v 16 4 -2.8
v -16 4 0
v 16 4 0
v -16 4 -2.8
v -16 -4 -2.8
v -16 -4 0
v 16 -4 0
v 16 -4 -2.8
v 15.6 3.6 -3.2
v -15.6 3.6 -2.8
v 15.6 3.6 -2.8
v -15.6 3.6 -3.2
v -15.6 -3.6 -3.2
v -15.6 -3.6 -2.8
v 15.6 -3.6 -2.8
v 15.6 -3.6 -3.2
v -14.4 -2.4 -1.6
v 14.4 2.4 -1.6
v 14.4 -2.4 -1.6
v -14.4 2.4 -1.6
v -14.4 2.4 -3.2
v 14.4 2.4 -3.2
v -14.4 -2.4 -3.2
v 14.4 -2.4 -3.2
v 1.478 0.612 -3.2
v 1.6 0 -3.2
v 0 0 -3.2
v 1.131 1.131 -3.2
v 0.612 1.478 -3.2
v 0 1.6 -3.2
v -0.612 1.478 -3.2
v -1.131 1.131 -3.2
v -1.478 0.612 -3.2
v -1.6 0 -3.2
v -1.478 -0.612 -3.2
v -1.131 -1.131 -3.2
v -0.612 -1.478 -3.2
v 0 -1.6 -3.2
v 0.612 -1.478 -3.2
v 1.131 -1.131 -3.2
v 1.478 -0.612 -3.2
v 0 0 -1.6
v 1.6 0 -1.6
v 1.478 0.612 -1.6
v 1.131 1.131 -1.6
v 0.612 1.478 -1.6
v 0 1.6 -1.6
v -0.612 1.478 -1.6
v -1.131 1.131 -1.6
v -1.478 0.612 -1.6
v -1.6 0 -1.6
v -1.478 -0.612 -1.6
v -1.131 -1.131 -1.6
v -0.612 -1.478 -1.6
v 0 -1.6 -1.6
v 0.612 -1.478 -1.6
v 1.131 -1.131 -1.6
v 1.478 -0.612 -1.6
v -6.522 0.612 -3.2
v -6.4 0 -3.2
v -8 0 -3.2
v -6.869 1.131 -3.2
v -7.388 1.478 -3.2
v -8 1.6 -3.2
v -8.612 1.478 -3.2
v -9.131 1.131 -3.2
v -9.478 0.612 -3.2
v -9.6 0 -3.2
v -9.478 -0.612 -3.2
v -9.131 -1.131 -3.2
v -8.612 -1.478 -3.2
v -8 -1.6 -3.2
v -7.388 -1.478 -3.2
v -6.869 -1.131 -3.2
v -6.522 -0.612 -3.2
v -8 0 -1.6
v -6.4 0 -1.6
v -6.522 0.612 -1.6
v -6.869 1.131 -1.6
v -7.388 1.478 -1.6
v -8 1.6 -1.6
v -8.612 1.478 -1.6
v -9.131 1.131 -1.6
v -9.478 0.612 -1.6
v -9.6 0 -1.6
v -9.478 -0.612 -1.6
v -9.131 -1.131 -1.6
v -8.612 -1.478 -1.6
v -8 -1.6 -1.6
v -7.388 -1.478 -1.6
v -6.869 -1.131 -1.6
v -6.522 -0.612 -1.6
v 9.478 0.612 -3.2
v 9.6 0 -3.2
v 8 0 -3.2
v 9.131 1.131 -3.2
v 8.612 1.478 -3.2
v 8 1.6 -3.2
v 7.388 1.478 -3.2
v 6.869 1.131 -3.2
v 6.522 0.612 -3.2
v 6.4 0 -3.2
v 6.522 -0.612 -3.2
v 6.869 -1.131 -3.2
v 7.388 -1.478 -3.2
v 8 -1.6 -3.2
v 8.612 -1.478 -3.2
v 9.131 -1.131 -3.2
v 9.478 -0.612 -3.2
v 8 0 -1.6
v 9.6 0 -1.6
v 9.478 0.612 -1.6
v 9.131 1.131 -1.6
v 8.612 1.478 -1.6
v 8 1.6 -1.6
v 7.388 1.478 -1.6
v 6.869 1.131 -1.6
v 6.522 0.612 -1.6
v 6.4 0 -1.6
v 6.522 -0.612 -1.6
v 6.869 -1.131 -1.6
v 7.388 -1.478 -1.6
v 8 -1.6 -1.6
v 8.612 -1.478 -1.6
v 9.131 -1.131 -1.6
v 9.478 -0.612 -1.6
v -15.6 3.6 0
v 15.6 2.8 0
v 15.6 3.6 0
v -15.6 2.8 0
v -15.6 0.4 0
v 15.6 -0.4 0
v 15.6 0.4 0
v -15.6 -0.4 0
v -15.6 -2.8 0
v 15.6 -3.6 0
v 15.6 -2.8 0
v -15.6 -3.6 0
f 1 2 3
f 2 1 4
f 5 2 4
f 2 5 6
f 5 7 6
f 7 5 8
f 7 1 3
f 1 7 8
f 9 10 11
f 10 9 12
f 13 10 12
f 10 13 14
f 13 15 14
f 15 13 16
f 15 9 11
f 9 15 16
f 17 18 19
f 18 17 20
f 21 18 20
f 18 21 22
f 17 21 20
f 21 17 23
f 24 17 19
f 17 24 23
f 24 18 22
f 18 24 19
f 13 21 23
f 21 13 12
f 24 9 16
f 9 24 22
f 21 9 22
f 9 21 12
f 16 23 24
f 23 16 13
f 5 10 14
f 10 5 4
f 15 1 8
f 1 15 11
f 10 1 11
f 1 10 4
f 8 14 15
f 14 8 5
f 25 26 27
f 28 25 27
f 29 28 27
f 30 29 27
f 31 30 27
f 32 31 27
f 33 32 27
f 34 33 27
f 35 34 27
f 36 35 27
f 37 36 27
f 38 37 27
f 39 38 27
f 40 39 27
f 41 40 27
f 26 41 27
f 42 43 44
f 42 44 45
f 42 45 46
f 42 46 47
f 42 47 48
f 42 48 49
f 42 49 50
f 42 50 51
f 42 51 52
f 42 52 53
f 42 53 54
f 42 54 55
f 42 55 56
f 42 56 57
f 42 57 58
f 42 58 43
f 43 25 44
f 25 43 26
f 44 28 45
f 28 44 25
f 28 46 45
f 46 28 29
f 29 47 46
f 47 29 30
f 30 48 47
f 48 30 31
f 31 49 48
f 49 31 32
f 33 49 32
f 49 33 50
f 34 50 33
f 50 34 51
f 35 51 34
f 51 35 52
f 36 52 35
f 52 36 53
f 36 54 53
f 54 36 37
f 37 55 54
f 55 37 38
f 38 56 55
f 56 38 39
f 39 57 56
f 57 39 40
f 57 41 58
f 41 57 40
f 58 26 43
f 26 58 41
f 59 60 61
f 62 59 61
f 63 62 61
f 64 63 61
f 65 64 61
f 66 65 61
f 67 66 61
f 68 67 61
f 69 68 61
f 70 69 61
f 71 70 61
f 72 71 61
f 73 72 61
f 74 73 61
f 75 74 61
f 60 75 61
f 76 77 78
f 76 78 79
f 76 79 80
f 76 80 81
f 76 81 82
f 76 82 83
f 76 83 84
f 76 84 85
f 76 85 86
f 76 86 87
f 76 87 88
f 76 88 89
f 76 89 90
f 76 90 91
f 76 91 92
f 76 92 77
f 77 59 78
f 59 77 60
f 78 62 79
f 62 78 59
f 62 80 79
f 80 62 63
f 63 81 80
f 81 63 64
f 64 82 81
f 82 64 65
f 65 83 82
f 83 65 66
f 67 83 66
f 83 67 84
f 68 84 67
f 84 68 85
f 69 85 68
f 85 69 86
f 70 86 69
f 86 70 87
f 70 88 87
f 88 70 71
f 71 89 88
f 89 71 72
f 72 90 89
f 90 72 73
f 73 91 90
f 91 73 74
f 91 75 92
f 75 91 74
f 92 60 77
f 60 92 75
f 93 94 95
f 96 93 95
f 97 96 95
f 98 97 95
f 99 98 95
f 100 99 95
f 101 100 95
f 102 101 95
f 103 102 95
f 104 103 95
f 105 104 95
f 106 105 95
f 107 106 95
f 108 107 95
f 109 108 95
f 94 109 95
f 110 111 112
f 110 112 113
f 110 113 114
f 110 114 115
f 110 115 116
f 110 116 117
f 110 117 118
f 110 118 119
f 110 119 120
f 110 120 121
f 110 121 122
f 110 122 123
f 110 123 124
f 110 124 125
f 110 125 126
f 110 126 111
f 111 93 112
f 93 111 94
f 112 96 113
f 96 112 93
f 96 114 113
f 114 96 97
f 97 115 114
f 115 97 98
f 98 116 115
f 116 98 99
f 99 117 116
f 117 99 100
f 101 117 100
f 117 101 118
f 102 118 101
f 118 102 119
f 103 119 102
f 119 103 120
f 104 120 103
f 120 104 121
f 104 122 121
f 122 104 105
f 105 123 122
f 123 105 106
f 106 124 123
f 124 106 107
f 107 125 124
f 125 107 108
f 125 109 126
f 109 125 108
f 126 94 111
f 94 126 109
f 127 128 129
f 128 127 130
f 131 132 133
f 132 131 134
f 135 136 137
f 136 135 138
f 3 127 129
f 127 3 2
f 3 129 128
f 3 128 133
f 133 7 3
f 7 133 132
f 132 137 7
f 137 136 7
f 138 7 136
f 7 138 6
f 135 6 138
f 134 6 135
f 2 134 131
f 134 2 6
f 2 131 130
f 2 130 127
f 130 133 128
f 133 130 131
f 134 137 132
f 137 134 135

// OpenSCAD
// file: ../p/4-4edge.scad
use <../lib.scad>
function ldraw_lib__4_4edge() = [
// 0 Circle 1.0
// 0 Name: 4-4edge.dat
// 0 Author: James Jessiman
// 0 !LDRAW_ORG Primitive UPDATE 2017-01
// 0 !LICENSE Licensed under CC BY 2.0 and CC BY 4.0 : see CAreadme.txt
// 
// 0 BFC CERTIFY CCW
  [0,"BFC","CERTIFY"],
  [0,"BFC","CCW"],
// 
// 0 !HISTORY 1998-12-15 [PTadmin] Official Update 1998-10
// 0 !HISTORY 2005-12-28 [PTadmin] Official Update 2005-01
// 0 !HISTORY 2007-06-24 [PTadmin] Header formatted for Contributor Agreement
// 0 !HISTORY 2008-07-01 [PTadmin] Official Update 2008-01
// 0 !HISTORY 2017-01-15 [Steffen] BFCed
// 0 !HISTORY 2017-12-30 [PTadmin] Official Update 2017-01
// 
// 
// 2 24 1 0 0 0.9239 0 0.3827
  [2,24,1,0,0,0.9239,0,0.3827],
// 2 24 0.9239 0 0.3827 0.7071 0 0.7071
  [2,24,0.9239,0,0.3827,0.7071,0,0.7071],
// 2 24 0.7071 0 0.7071 0.3827 0 0.9239
  [2,24,0.7071,0,0.7071,0.3827,0,0.9239],
// 2 24 0.3827 0 0.9239 0 0 1
  [2,24,0.3827,0,0.9239,0,0,1],
// 2 24 0 0 1 -0.3827 0 0.9239
  [2,24,0,0,1,-0.3827,0,0.9239],
// 2 24 -0.3827 0 0.9239 -0.7071 0 0.7071
  [2,24,-0.3827,0,0.9239,-0.7071,0,0.7071],
// 2 24 -0.7071 0 0.7071 -0.9239 0 0.3827
  [2,24,-0.7071,0,0.7071,-0.9239,0,0.3827],
// 2 24 -0.9239 0 0.3827 -1 0 -0
  [2,24,-0.9239,0,0.3827,-1,0,-0],
// 2 24 -1 0 -0 -0.9239 0 -0.3827
  [2,24,-1,0,-0,-0.9239,0,-0.3827],
// 2 24 -0.9239 0 -0.3827 -0.7071 0 -0.7071
  [2,24,-0.9239,0,-0.3827,-0.7071,0,-0.7071],
// 2 24 -0.7071 0 -0.7071 -0.3827 0 -0.9239
  [2,24,-0.7071,0,-0.7071,-0.3827,0,-0.9239],
// 2 24 -0.3827 0 -0.9239 0 0 -1
  [2,24,-0.3827,0,-0.9239,0,0,-1],
// 2 24 0 0 -1 0.3827 0 -0.9239
  [2,24,0,0,-1,0.3827,0,-0.9239],
// 2 24 0.3827 0 -0.9239 0.7071 0 -0.7071
  [2,24,0.3827,0,-0.9239,0.7071,0,-0.7071],
// 2 24 0.7071 0 -0.7071 0.9239 0 -0.3827
  [2,24,0.7071,0,-0.7071,0.9239,0,-0.3827],
// 2 24 0.9239 0 -0.3827 1 0 0
  [2,24,0.9239,0,-0.3827,1,0,0],
];
module ldraw_lib__4_4edge(step=0, col=false, unit=2/5, alt=false, line=0.2, solid=!$preview)
    makepoly(ldraw_lib__4_4edge(), step=step, col=col, unit=unit, alt=alt, line=line, solid=solid);
ldraw_lib__4_4edge(line=0.2);
// file: ../p/4-4disc.scad
use <../lib.scad>
function ldraw_lib__4_4disc() = [
// 0 Disc 1.0
// 0 Name: 4-4disc.dat
// 0 Author: James Jessiman
// 0 !LDRAW_ORG Primitive UPDATE 2002-02
// 0 !LICENSE Licensed under CC BY 2.0 and CC BY 4.0 : see CAreadme.txt
// 
// 0 BFC CERTIFY CCW
  [0,"BFC","CERTIFY"],
  [0,"BFC","CCW"],
// 
// 0 !HISTORY 1998-12-15 [PTadmin] Official Update 1998-10
// 0 !HISTORY 2002-03-23 [sbliss] Added BFC statement
// 0 !HISTORY 2002-04-25 [PTadmin] Official Update 2002-02
// 0 !HISTORY 2007-06-24 [PTadmin] Header formatted for Contributor Agreement
// 0 !HISTORY 2008-07-01 [PTadmin] Official Update 2008-01
// 
// 
// 3 16 0 0 0 1 0 0 0.9239 0 0.3827
  [3,16,0,0,0,1,0,0,0.9239,0,0.3827],
// 3 16 0 0 0 0.9239 0 0.3827 0.7071 0 0.7071
  [3,16,0,0,0,0.9239,0,0.3827,0.7071,0,0.7071],
// 3 16 0 0 0 0.7071 0 0.7071 0.3827 0 0.9239
  [3,16,0,0,0,0.7071,0,0.7071,0.3827,0,0.9239],
// 3 16 0 0 0 0.3827 0 0.9239 0 0 1
  [3,16,0,0,0,0.3827,0,0.9239,0,0,1],
// 3 16 0 0 0 0 0 1 -0.3827 0 0.9239
  [3,16,0,0,0,0,0,1,-0.3827,0,0.9239],
// 3 16 0 0 0 -0.3827 0 0.9239 -0.7071 0 0.7071
  [3,16,0,0,0,-0.3827,0,0.9239,-0.7071,0,0.7071],
// 3 16 0 0 0 -0.7071 0 0.7071 -0.9239 0 0.3827
  [3,16,0,0,0,-0.7071,0,0.7071,-0.9239,0,0.3827],
// 3 16 0 0 0 -0.9239 0 0.3827 -1 0 -0
  [3,16,0,0,0,-0.9239,0,0.3827,-1,0,-0],
// 3 16 0 0 0 -1 0 -0 -0.9239 0 -0.3827
  [3,16,0,0,0,-1,0,-0,-0.9239,0,-0.3827],
// 3 16 0 0 0 -0.9239 0 -0.3827 -0.7071 0 -0.7071
  [3,16,0,0,0,-0.9239,0,-0.3827,-0.7071,0,-0.7071],
// 3 16 0 0 0 -0.7071 0 -0.7071 -0.3827 0 -0.9239
  [3,16,0,0,0,-0.7071,0,-0.7071,-0.3827,0,-0.9239],
// 3 16 0 0 0 -0.3827 0 -0.9239 0 0 -1
  [3,16,0,0,0,-0.3827,0,-0.9239,0,0,-1],
// 3 16 0 0 0 0 0 -1 0.3827 0 -0.9239
  [3,16,0,0,0,0,0,-1,0.3827,0,-0.9239],
// 3 16 0 0 0 0.3827 0 -0.9239 0.7071 0 -0.7071
  [3,16,0,0,0,0.3827,0,-0.9239,0.7071,0,-0.7071],
// 3 16 0 0 0 0.7071 0 -0.7071 0.9239 0 -0.3827
  [3,16,0,0,0,0.7071,0,-0.7071,0.9239,0,-0.3827],
// 3 16 0 0 0 0.9239 0 -0.3827 1 0 0
  [3,16,0,0,0,0.9239,0,-0.3827,1,0,0],
// 0
];
module ldraw_lib__4_4disc(step=0, col=false, unit=2/5, alt=false, line=0.2, solid=!$preview)
    makepoly(ldraw_lib__4_4disc(), step=step, col=col, unit=unit, alt=alt, line=line, solid=solid);
ldraw_lib__4_4disc(line=0.2);
// file: ../p/4-4cyli.scad
use <../lib.scad>
$fa=1; $fs=0.2;
function ldraw_lib__4_4cyli(realsolid=false) = [
// 0 Cylinder 1.0
// 0 Name: 4-4cyli.dat
// 0 Author: James Jessiman
// 0 !LDRAW_ORG Primitive UPDATE 2005-01
// 0 !LICENSE Licensed under CC BY 2.0 and CC BY 4.0 : see CAreadme.txt
// 
// 0 BFC CERTIFY CCW
  [0,"BFC","CERTIFY"],
  [0,"BFC","CCW"],
// 
// 0 !HISTORY 1998-12-15 [PTadmin] Official Update 1998-10
// 0 !HISTORY 2002-03-23 [sbliss] Added BFC statement; merged headers from files in distributions LDraw 0.27 and Complete.
// 0 !HISTORY 2002-04-25 [PTadmin] Official Update 2002-02
// 0 !HISTORY 2004-12-14 [guyvivan] BFC CCW
// 0 !HISTORY 2005-12-28 [PTadmin] Official Update 2005-01
// 0 !HISTORY 2007-06-24 [PTadmin] Header formatted for Contributor Agreement
// 0 !HISTORY 2008-07-01 [PTadmin] Official Update 2008-01
// 
// 
// 4 16 1 1 0 0.9239 1 0.3827 0.9239 0 0.3827 1 0 0
  [4,16,1,1,0,0.9239,1,0.3827,0.9239,0,0.3827,1,0,0],
// 5 24 1 0 0 1 1 0 0.9239 0 0.3827 0.9239 0 -0.3827
  [5,24,1,0,0,1,1,0,0.9239,0,0.3827,0.9239,0,-0.3827],
// 4 16 0.9239 1 0.3827 0.7071 1 0.7071 0.7071 0 0.7071 0.9239 0 0.3827
  [4,16,0.9239,1,0.3827,0.7071,1,0.7071,0.7071,0,0.7071,0.9239,0,0.3827],
// 5 24 0.9239 0 0.3827 0.9239 1 0.3827 0.7071 0 0.7071 1 0 0
  [5,24,0.9239,0,0.3827,0.9239,1,0.3827,0.7071,0,0.7071,1,0,0],
// 4 16 0.7071 1 0.7071 0.3827 1 0.9239 0.3827 0 0.9239 0.7071 0 0.7071
  [4,16,0.7071,1,0.7071,0.3827,1,0.9239,0.3827,0,0.9239,0.7071,0,0.7071],
// 5 24 0.7071 0 0.7071 0.7071 1 0.7071 0.3827 0 0.9239 0.9239 0 0.3827
  [5,24,0.7071,0,0.7071,0.7071,1,0.7071,0.3827,0,0.9239,0.9239,0,0.3827],
// 4 16 0.3827 1 0.9239 0 1 1 0 0 1 0.3827 0 0.9239
  [4,16,0.3827,1,0.9239,0,1,1,0,0,1,0.3827,0,0.9239],
// 5 24 0.3827 0 0.9239 0.3827 1 0.9239 0 0 1 0.7071 0 0.7071
  [5,24,0.3827,0,0.9239,0.3827,1,0.9239,0,0,1,0.7071,0,0.7071],
// 4 16 0 1 1 -0.3827 1 0.9239 -0.3827 0 0.9239 0 0 1
  [4,16,0,1,1,-0.3827,1,0.9239,-0.3827,0,0.9239,0,0,1],
// 5 24 0 0 1 0 1 1 -0.3827 0 0.9239 0.3827 0 0.9239
  [5,24,0,0,1,0,1,1,-0.3827,0,0.9239,0.3827,0,0.9239],
// 4 16 -0.3827 1 0.9239 -0.7071 1 0.7071 -0.7071 0 0.7071 -0.3827 0 0.9239
  [4,16,-0.3827,1,0.9239,-0.7071,1,0.7071,-0.7071,0,0.7071,-0.3827,0,0.9239],
// 5 24 -0.3827 0 0.9239 -0.3827 1 0.9239 -0.7071 0 0.7071 0 0 1
  [5,24,-0.3827,0,0.9239,-0.3827,1,0.9239,-0.7071,0,0.7071,0,0,1],
// 4 16 -0.7071 1 0.7071 -0.9239 1 0.3827 -0.9239 0 0.3827 -0.7071 0 0.7071
  [4,16,-0.7071,1,0.7071,-0.9239,1,0.3827,-0.9239,0,0.3827,-0.7071,0,0.7071],
// 5 24 -0.7071 0 0.7071 -0.7071 1 0.7071 -0.9239 0 0.3827 -0.3827 0 0.9239
  [5,24,-0.7071,0,0.7071,-0.7071,1,0.7071,-0.9239,0,0.3827,-0.3827,0,0.9239],
// 4 16 -0.9239 1 0.3827 -1 1 0 -1 0 0 -0.9239 0 0.3827
  [4,16,-0.9239,1,0.3827,-1,1,0,-1,0,0,-0.9239,0,0.3827],
// 5 24 -0.9239 0 0.3827 -0.9239 1 0.3827 -1 0 0 -0.7071 0 0.7071
  [5,24,-0.9239,0,0.3827,-0.9239,1,0.3827,-1,0,0,-0.7071,0,0.7071],
// 4 16 -1 1 0 -0.9239 1 -0.3827 -0.9239 0 -0.3827 -1 0 0
  [4,16,-1,1,0,-0.9239,1,-0.3827,-0.9239,0,-0.3827,-1,0,0],
// 5 24 -1 0 0 -1 1 0 -0.9239 0 -0.3827 -0.9239 0 0.3827
  [5,24,-1,0,0,-1,1,0,-0.9239,0,-0.3827,-0.9239,0,0.3827],
// 4 16 -0.9239 1 -0.3827 -0.7071 1 -0.7071 -0.7071 0 -0.7071 -0.9239 0 -0.3827
  [4,16,-0.9239,1,-0.3827,-0.7071,1,-0.7071,-0.7071,0,-0.7071,-0.9239,0,-0.3827],
// 5 24 -0.9239 0 -0.3827 -0.9239 1 -0.3827 -0.7071 0 -0.7071 -1 0 0
  [5,24,-0.9239,0,-0.3827,-0.9239,1,-0.3827,-0.7071,0,-0.7071,-1,0,0],
// 4 16 -0.7071 1 -0.7071 -0.3827 1 -0.9239 -0.3827 0 -0.9239 -0.7071 0 -0.7071
  [4,16,-0.7071,1,-0.7071,-0.3827,1,-0.9239,-0.3827,0,-0.9239,-0.7071,0,-0.7071],
// 5 24 -0.7071 0 -0.7071 -0.7071 1 -0.7071 -0.3827 0 -0.9239 -0.9239 0 -0.3827
  [5,24,-0.7071,0,-0.7071,-0.7071,1,-0.7071,-0.3827,0,-0.9239,-0.9239,0,-0.3827],
// 4 16 -0.3827 1 -0.9239 0 1 -1 0 0 -1 -0.3827 0 -0.9239
  [4,16,-0.3827,1,-0.9239,0,1,-1,0,0,-1,-0.3827,0,-0.9239],
// 5 24 -0.3827 0 -0.9239 -0.3827 1 -0.9239 0 0 -1 -0.7071 0 -0.7071
  [5,24,-0.3827,0,-0.9239,-0.3827,1,-0.9239,0,0,-1,-0.7071,0,-0.7071],
// 4 16 0 1 -1 0.3827 1 -0.9239 0.3827 0 -0.9239 0 0 -1
  [4,16,0,1,-1,0.3827,1,-0.9239,0.3827,0,-0.9239,0,0,-1],
// 5 24 0 0 -1 0 1 -1 0.3827 0 -0.9239 -0.3827 0 -0.9239
  [5,24,0,0,-1,0,1,-1,0.3827,0,-0.9239,-0.3827,0,-0.9239],
// 4 16 0.3827 1 -0.9239 0.7071 1 -0.7071 0.7071 0 -0.7071 0.3827 0 -0.9239
  [4,16,0.3827,1,-0.9239,0.7071,1,-0.7071,0.7071,0,-0.7071,0.3827,0,-0.9239],
// 5 24 0.3827 0 -0.9239 0.3827 1 -0.9239 0.7071 0 -0.7071 0 0 -1
  [5,24,0.3827,0,-0.9239,0.3827,1,-0.9239,0.7071,0,-0.7071,0,0,-1],
// 4 16 0.7071 1 -0.7071 0.9239 1 -0.3827 0.9239 0 -0.3827 0.7071 0 -0.7071
  [4,16,0.7071,1,-0.7071,0.9239,1,-0.3827,0.9239,0,-0.3827,0.7071,0,-0.7071],
// 5 24 0.7071 0 -0.7071 0.7071 1 -0.7071 0.9239 0 -0.3827 0.3827 0 -0.9239
  [5,24,0.7071,0,-0.7071,0.7071,1,-0.7071,0.9239,0,-0.3827,0.3827,0,-0.9239],
// 4 16 0.9239 1 -0.3827 1 1 0 1 0 0 0.9239 0 -0.3827
  [4,16,0.9239,1,-0.3827,1,1,0,1,0,0,0.9239,0,-0.3827],
// 5 24 0.9239 0 -0.3827 0.9239 1 -0.3827 1 0 0 0.7071 0 -0.7071
  [5,24,0.9239,0,-0.3827,0.9239,1,-0.3827,1,0,0,0.7071,0,-0.7071],
// 0
];
module ldraw_lib__4_4cyli(step=0, col=false, unit=2/5, alt=false, line=0.2, solid=!$preview)
    makepoly(ldraw_lib__4_4cyli(solid), step=step, col=col, unit=unit, alt=alt, line=line, solid=solid);
ldraw_lib__4_4cyli(line=0.2);
// file: ../p/stud3.scad
use <../lib.scad>
use <4-4cyli.scad>
use <4-4disc.scad>
use <4-4edge.scad>
function ldraw_lib__stud3() = [
// 0 Stud Tube Solid
// 0 Name: stud3.dat
// 0 Author: James Jessiman
// 0 !LDRAW_ORG Primitive UPDATE 2012-01
// 0 !LICENSE Licensed under CC BY 4.0 : see CAreadme.txt
// 
// 0 BFC CERTIFY CCW
  [0,"BFC","CERTIFY"],
  [0,"BFC","CCW"],
// 
// 0 !HISTORY 2002-04-04 [sbliss] Modified for BFC compliance
// 0 !HISTORY 2002-04-25 [PTadmin] Official Update 2002-02
// 0 !HISTORY 2007-06-24 [PTadmin] Header formatted for Contributor Agreement
// 0 !HISTORY 2008-07-01 [PTadmin] Official Update 2008-01
// 0 !HISTORY 2012-02-16 [Philo] Changed to CCW
// 0 !HISTORY 2012-03-30 [PTadmin] Official Update 2012-01
// 
// 
// 1 16 0 -4 0 4 0 0 0 1 0 0 0 4 4-4edge.dat
  [1,16,0,-4,0,4,0,0,0,1,0,0,0,4, ldraw_lib__4_4edge()],
// 1 16 0 0 0 4 0 0 0 1 0 0 0 4 4-4edge.dat
  [1,16,0,0,0,4,0,0,0,1,0,0,0,4, ldraw_lib__4_4edge()],
// 1 16 0 -4 0 4 0 0 0 1 0 0 0 4 4-4disc.dat
  [1,16,0,-4,0,4,0,0,0,1,0,0,0,4, ldraw_lib__4_4disc()],
  [-1,16,0,0,0,4,0,0,0,-1,0,0,0,4, ldraw_lib__4_4disc()],
// 1 16 0 -4 0 4 0 0 0 4 0 0 0 4 4-4cyli.dat
  [1,16,0,-4,0,4,0,0,0,4,0,0,0,4, ldraw_lib__4_4cyli()],
];
module ldraw_lib__stud3(step=0, col=false, unit=2/5, alt=false, line=0.2, solid=!$preview)
    makepoly(ldraw_lib__stud3(), step=step, col=col, unit=unit, alt=alt, line=line, solid=solid);
ldraw_lib__stud3(line=0.2);
// file: ../p/box5.scad
use <../lib.scad>
function ldraw_lib__box5() = [
// 0 Box with 5 Faces and All Edges
// 0 Name: box5.dat
// 0 Author: James Jessiman
// 0 !LDRAW_ORG Primitive UPDATE 2012-01
// 0 !LICENSE Licensed under CC BY 2.0 and CC BY 4.0 : see CAreadme.txt
// 
// 0 BFC CERTIFY CCW
  [0,"BFC","CERTIFY"],
  [0,"BFC","CCW"],
// 
// 0 !HISTORY 2002-04-03 [sbliss] Modified for BFC compliance
// 0 !HISTORY 2002-04-25 [PTadmin] Official Update 2002-02
// 0 !HISTORY 2007-06-24 [PTadmin] Header formatted for Contributor Agreement
// 0 !HISTORY 2008-07-01 [PTadmin] Official Update 2008-01
// 0 !HISTORY 2012-02-16 [Philo] Changed to CCW
// 0 !HISTORY 2012-03-30 [PTadmin] Official Update 2012-01
// 
// 
// 2 24 1 1 1 -1 1 1
  [2,24,1,1,1,-1,1,1],
// 2 24 -1 1 1 -1 1 -1
  [2,24,-1,1,1,-1,1,-1],
// 2 24 -1 1 -1 1 1 -1
  [2,24,-1,1,-1,1,1,-1],
// 2 24 1 1 -1 1 1 1
  [2,24,1,1,-1,1,1,1],
// 2 24 1 0 1 -1 0 1
  [2,24,1,0,1,-1,0,1],
// 2 24 -1 0 1 -1 0 -1
  [2,24,-1,0,1,-1,0,-1],
// 2 24 -1 0 -1 1 0 -1
  [2,24,-1,0,-1,1,0,-1],
// 2 24 1 0 -1 1 0 1
  [2,24,1,0,-1,1,0,1],
// 2 24 1 0 1 1 1 1
  [2,24,1,0,1,1,1,1],
// 2 24 -1 0 1 -1 1 1
  [2,24,-1,0,1,-1,1,1],
// 2 24 1 0 -1 1 1 -1
  [2,24,1,0,-1,1,1,-1],
// 2 24 -1 0 -1 -1 1 -1
  [2,24,-1,0,-1,-1,1,-1],
// 4 16 -1 1 1 1 1 1 1 1 -1 -1 1 -1
  [4,16,-1,1,1,1,1,1,1,1,-1,-1,1,-1],
// 4 16 -1 1 1 -1 0 1 1 0 1 1 1 1
  [4,16,-1,1,1,-1,0,1,1,0,1,1,1,1],
// 4 16 -1 1 -1 -1 0 -1 -1 0 1 -1 1 1
  [4,16,-1,1,-1,-1,0,-1,-1,0,1,-1,1,1],
// 4 16 1 1 -1 1 0 -1 -1 0 -1 -1 1 -1
  [4,16,1,1,-1,1,0,-1,-1,0,-1,-1,1,-1],
// 4 16 1 1 1 1 0 1 1 0 -1 1 1 -1
  [4,16,1,1,1,1,0,1,1,0,-1,1,1,-1],
];
makepoly(ldraw_lib__box5(), line=0.2);
// file: ../p/box4.scad
use <../lib.scad>
function ldraw_lib__box4() = [
// 0 Box with 4 Faces (2 Parallel Pairs) and All Edges
// 0 Name: box4.dat
// 0 Author: James Jessiman
// 0 !LDRAW_ORG Primitive UPDATE 2012-01
// 0 !LICENSE Licensed under CC BY 4.0 : see CAreadme.txt
// 
// 0 BFC CERTIFY CCW
  [0,"BFC","CERTIFY"],
  [0,"BFC","CCW"],
// 
// 0 !HISTORY 2002-04-03 [sbliss] Modified for BFC compliance
// 0 !HISTORY 2002-04-25 [PTadmin] Official Update 2002-02
// 0 !HISTORY 2007-06-24 [PTadmin] Header formatted for Contributor Agreement
// 0 !HISTORY 2008-07-01 [PTadmin] Official Update 2008-01
// 0 !HISTORY 2012-02-16 [Philo] Changed to CCW
// 0 !HISTORY 2012-03-30 [PTadmin] Official Update 2012-01
// 
// 
// 2 24 1 1 1 -1 1 1
  [2,24,1,1,1,-1,1,1],
// 2 24 -1 1 1 -1 1 -1
  [2,24,-1,1,1,-1,1,-1],
// 2 24 -1 1 -1 1 1 -1
  [2,24,-1,1,-1,1,1,-1],
// 2 24 1 1 -1 1 1 1
  [2,24,1,1,-1,1,1,1],
// 2 24 1 0 1 -1 0 1
  [2,24,1,0,1,-1,0,1],
// 2 24 -1 0 1 -1 0 -1
  [2,24,-1,0,1,-1,0,-1],
// 2 24 -1 0 -1 1 0 -1
  [2,24,-1,0,-1,1,0,-1],
// 2 24 1 0 -1 1 0 1
  [2,24,1,0,-1,1,0,1],
// 2 24 1 0 1 1 1 1
  [2,24,1,0,1,1,1,1],
// 2 24 -1 0 1 -1 1 1
  [2,24,-1,0,1,-1,1,1],
// 2 24 1 0 -1 1 1 -1
  [2,24,1,0,-1,1,1,-1],
// 2 24 -1 0 -1 -1 1 -1
  [2,24,-1,0,-1,-1,1,-1],
// 4 16 -1 1 1 -1 0 1 1 0 1 1 1 1
  [4,16,-1,1,1,-1,0,1,1,0,1,1,1,1],
// 4 16 -1 1 -1 -1 0 -1 -1 0 1 -1 1 1
  [4,16,-1,1,-1,-1,0,-1,-1,0,1,-1,1,1],
// 4 16 1 1 -1 1 0 -1 -1 0 -1 -1 1 -1
  [4,16,1,1,-1,1,0,-1,-1,0,-1,-1,1,-1],
// 4 16 1 1 1 1 0 1 1 0 -1 1 1 -1
  [4,16,1,1,1,1,0,1,1,0,-1,1,1,-1],
];
module ldraw_lib__box4(step=0, col=false, unit=2/5, alt=false, line=0.2, solid=!$preview)
    makepoly(ldraw_lib__box4(), step=step, col=col, unit=unit, alt=alt, line=line, solid=solid);
ldraw_lib__box4(line=0.2);
// file: s/2431s01.scad
use <../../lib.scad>
use <../../p/box4.scad>
use <../../p/box5.scad>
use <../../p/stud3.scad>
function ldraw_lib__s__2431s01() = [
// 0 ~Tile  1 x  4 with Groove without Top Face
// 0 Name: s\2431s01.dat
// 0 Author: Santeri Piippo [arezey]
// 0 !LDRAW_ORG Subpart UPDATE 2010-02
// 0 !LICENSE Licensed under CC BY 2.0 and CC BY 4.0 : see CAreadme.txt
// 
// 0 BFC CERTIFY CCW
  [0,"BFC","CERTIFY"],
  [0,"BFC","CCW"],
// 
// 0 !HISTORY 2010-07-05 [PTadmin] Official Update 2010-02
// 
// 
// 1 16 0 0 0 40 0 0 0 7 0 0 0 10 box4.dat
  [1,16,0,0,0,40,0,0,0,7,0,0,0,10, ldraw_lib__box4()],
// 1 16 0 7 0 39 0 0 0 1 0 0 0 9 box4.dat
  [1,16,0,7,0,39,0,0,0,1,0,0,0,9, ldraw_lib__box4()],
// 0 BFC INVERTNEXT
  [0,"BFC","INVERTNEXT"],
// 1 16 0 8 0 36 0 0 0 -4 0 0 0 6 box5.dat
  [1,16,0,8,0,36,0,0,0,-4,0,0,0,6, ldraw_lib__box5()],
// 4 16 -39 8 9 -36 8 6 -36 8 -6 -39 8 -9
  [4,16,-39,8,9,-36,8,6,-36,8,-6,-39,8,-9],
// 4 16 39 8 -9 36 8 -6 36 8 6 39 8 9
  [4,16,39,8,-9,36,8,-6,36,8,6,39,8,9],
// 4 16 39 8 9 36 8 6 -36 8 6 -39 8 9
  [4,16,39,8,9,36,8,6,-36,8,6,-39,8,9],
// 4 16 -39 8 -9 -36 8 -6 36 8 -6 39 8 -9
  [4,16,-39,8,-9,-36,8,-6,36,8,-6,39,8,-9],
// 4 16 -40 7 10 -39 7 9 -39 7 -9 -40 7 -10
  [4,16,-40,7,10,-39,7,9,-39,7,-9,-40,7,-10],
// 4 16 40 7 -10 39 7 -9 39 7 9 40 7 10
  [4,16,40,7,-10,39,7,-9,39,7,9,40,7,10],
// 4 16 40 7 10 39 7 9 -39 7 9 -40 7 10
  [4,16,40,7,10,39,7,9,-39,7,9,-40,7,10],
// 4 16 -40 7 -10 -39 7 -9 39 7 -9 40 7 -10
  [4,16,-40,7,-10,-39,7,-9,39,7,-9,40,7,-10],
// 1 16 0 4 0 1 0 0 0 -1 0 0 0 1 stud3.dat
  [1,16,0,4,0,1,0,0,0,-1,0,0,0,1, ldraw_lib__stud3()],
// 1 16 -20 4 0 1 0 0 0 -1 0 0 0 1 stud3.dat
  [1,16,-20,4,0,1,0,0,0,-1,0,0,0,1, ldraw_lib__stud3()],
// 1 16 20 4 0 1 0 0 0 -1 0 0 0 1 stud3.dat
  [1,16,20,4,0,1,0,0,0,-1,0,0,0,1, ldraw_lib__stud3()],
// 0 //
];
makepoly(ldraw_lib__s__2431s01(), line=0.2);
// main file
use <../lib.scad>
use <s/2431s01.scad>
function ldraw_lib__2431p09() = [
// 0 Tile  1 x  4 with 3 Metallic Silver Stripes Pattern
// 0 Name: 2431p09.dat
// 0 Author: Magnus Forsberg [MagFors]
// 0 !LDRAW_ORG Part UPDATE 2024-06
// 0 !LICENSE Licensed under CC BY 4.0 : see CAreadme.txt
// 
// 0 BFC CERTIFY CCW
  [0,"BFC","CERTIFY"],
  [0,"BFC","CCW"],
// 
// 0 !KEYWORDS Bricklink 2431pb805, Camaro, Chevrolet, light, rear, set 10304
// 
// 0 !HISTORY 2024-07-29 [OrionP] Official Update 2024-06
// 
// 1 16 0 0 0 1 0 0 0 1 0 0 0 1 s\2431s01.dat
  [1,16,0,0,0,1,0,0,0,1,0,0,0,1, ldraw_lib__s__2431s01()],
// 4 80 39 0 9 -39 0 9 -39 0 7 39 0 7
  [4,80,39,0,9,-39,0,9,-39,0,7,39,0,7],
// 4 80 39 0 1 -39 0 1 -39 0 -1 39 0 -1
  [4,80,39,0,1,-39,0,1,-39,0,-1,39,0,-1],
// 4 80 39 0 -7 -39 0 -7 -39 0 -9 39 0 -9
  [4,80,39,0,-7,-39,0,-7,-39,0,-9,39,0,-9],
// 4 16 -40 0 10 -39 0 9 39 0 9 40 0 10
  [4,16,-40,0,10,-39,0,9,39,0,9,40,0,10],
// 3 16 40 0 10 39 0 9 39 0 7
  [3,16,40,0,10,39,0,9,39,0,7],
// 3 16 40 0 10 39 0 7 39 0 1
  [3,16,40,0,10,39,0,7,39,0,1],
// 4 16 40 0 10 39 0 1 39 0 -1 40 0 -10
  [4,16,40,0,10,39,0,1,39,0,-1,40,0,-10],
// 3 16 39 0 -1 39 0 -7 40 0 -10
  [3,16,39,0,-1,39,0,-7,40,0,-10],
// 3 16 39 0 -7 39 0 -9 40 0 -10
  [3,16,39,0,-7,39,0,-9,40,0,-10],
// 4 16 -39 0 -9 -40 0 -10 40 0 -10 39 0 -9
  [4,16,-39,0,-9,-40,0,-10,40,0,-10,39,0,-9],
// 3 16 -39 0 -7 -40 0 -10 -39 0 -9
  [3,16,-39,0,-7,-40,0,-10,-39,0,-9],
// 3 16 -39 0 -1 -40 0 -10 -39 0 -7
  [3,16,-39,0,-1,-40,0,-10,-39,0,-7],
// 4 16 -40 0 -10 -39 0 -1 -39 0 1 -40 0 10
  [4,16,-40,0,-10,-39,0,-1,-39,0,1,-40,0,10],
// 3 16 -40 0 10 -39 0 1 -39 0 7
  [3,16,-40,0,10,-39,0,1,-39,0,7],
// 3 16 -40 0 10 -39 0 7 -39 0 9
  [3,16,-40,0,10,-39,0,7,-39,0,9],
// 4 16 39 0 7 -39 0 7 -39 0 1 39 0 1
  [4,16,39,0,7,-39,0,7,-39,0,1,39,0,1],
// 4 16 39 0 -1 -39 0 -1 -39 0 -7 39 0 -7
  [4,16,39,0,-1,-39,0,-1,-39,0,-7,39,0,-7],
];
module ldraw_lib__2431p09(step=0, col=false, unit=2/5, alt=false, line=0.2, solid=!$preview)
    makepoly(ldraw_lib__2431p09(), step=step, col=col, unit=unit, alt=alt, line=line, solid=solid);
ldraw_lib__2431p09(line=0.2);
